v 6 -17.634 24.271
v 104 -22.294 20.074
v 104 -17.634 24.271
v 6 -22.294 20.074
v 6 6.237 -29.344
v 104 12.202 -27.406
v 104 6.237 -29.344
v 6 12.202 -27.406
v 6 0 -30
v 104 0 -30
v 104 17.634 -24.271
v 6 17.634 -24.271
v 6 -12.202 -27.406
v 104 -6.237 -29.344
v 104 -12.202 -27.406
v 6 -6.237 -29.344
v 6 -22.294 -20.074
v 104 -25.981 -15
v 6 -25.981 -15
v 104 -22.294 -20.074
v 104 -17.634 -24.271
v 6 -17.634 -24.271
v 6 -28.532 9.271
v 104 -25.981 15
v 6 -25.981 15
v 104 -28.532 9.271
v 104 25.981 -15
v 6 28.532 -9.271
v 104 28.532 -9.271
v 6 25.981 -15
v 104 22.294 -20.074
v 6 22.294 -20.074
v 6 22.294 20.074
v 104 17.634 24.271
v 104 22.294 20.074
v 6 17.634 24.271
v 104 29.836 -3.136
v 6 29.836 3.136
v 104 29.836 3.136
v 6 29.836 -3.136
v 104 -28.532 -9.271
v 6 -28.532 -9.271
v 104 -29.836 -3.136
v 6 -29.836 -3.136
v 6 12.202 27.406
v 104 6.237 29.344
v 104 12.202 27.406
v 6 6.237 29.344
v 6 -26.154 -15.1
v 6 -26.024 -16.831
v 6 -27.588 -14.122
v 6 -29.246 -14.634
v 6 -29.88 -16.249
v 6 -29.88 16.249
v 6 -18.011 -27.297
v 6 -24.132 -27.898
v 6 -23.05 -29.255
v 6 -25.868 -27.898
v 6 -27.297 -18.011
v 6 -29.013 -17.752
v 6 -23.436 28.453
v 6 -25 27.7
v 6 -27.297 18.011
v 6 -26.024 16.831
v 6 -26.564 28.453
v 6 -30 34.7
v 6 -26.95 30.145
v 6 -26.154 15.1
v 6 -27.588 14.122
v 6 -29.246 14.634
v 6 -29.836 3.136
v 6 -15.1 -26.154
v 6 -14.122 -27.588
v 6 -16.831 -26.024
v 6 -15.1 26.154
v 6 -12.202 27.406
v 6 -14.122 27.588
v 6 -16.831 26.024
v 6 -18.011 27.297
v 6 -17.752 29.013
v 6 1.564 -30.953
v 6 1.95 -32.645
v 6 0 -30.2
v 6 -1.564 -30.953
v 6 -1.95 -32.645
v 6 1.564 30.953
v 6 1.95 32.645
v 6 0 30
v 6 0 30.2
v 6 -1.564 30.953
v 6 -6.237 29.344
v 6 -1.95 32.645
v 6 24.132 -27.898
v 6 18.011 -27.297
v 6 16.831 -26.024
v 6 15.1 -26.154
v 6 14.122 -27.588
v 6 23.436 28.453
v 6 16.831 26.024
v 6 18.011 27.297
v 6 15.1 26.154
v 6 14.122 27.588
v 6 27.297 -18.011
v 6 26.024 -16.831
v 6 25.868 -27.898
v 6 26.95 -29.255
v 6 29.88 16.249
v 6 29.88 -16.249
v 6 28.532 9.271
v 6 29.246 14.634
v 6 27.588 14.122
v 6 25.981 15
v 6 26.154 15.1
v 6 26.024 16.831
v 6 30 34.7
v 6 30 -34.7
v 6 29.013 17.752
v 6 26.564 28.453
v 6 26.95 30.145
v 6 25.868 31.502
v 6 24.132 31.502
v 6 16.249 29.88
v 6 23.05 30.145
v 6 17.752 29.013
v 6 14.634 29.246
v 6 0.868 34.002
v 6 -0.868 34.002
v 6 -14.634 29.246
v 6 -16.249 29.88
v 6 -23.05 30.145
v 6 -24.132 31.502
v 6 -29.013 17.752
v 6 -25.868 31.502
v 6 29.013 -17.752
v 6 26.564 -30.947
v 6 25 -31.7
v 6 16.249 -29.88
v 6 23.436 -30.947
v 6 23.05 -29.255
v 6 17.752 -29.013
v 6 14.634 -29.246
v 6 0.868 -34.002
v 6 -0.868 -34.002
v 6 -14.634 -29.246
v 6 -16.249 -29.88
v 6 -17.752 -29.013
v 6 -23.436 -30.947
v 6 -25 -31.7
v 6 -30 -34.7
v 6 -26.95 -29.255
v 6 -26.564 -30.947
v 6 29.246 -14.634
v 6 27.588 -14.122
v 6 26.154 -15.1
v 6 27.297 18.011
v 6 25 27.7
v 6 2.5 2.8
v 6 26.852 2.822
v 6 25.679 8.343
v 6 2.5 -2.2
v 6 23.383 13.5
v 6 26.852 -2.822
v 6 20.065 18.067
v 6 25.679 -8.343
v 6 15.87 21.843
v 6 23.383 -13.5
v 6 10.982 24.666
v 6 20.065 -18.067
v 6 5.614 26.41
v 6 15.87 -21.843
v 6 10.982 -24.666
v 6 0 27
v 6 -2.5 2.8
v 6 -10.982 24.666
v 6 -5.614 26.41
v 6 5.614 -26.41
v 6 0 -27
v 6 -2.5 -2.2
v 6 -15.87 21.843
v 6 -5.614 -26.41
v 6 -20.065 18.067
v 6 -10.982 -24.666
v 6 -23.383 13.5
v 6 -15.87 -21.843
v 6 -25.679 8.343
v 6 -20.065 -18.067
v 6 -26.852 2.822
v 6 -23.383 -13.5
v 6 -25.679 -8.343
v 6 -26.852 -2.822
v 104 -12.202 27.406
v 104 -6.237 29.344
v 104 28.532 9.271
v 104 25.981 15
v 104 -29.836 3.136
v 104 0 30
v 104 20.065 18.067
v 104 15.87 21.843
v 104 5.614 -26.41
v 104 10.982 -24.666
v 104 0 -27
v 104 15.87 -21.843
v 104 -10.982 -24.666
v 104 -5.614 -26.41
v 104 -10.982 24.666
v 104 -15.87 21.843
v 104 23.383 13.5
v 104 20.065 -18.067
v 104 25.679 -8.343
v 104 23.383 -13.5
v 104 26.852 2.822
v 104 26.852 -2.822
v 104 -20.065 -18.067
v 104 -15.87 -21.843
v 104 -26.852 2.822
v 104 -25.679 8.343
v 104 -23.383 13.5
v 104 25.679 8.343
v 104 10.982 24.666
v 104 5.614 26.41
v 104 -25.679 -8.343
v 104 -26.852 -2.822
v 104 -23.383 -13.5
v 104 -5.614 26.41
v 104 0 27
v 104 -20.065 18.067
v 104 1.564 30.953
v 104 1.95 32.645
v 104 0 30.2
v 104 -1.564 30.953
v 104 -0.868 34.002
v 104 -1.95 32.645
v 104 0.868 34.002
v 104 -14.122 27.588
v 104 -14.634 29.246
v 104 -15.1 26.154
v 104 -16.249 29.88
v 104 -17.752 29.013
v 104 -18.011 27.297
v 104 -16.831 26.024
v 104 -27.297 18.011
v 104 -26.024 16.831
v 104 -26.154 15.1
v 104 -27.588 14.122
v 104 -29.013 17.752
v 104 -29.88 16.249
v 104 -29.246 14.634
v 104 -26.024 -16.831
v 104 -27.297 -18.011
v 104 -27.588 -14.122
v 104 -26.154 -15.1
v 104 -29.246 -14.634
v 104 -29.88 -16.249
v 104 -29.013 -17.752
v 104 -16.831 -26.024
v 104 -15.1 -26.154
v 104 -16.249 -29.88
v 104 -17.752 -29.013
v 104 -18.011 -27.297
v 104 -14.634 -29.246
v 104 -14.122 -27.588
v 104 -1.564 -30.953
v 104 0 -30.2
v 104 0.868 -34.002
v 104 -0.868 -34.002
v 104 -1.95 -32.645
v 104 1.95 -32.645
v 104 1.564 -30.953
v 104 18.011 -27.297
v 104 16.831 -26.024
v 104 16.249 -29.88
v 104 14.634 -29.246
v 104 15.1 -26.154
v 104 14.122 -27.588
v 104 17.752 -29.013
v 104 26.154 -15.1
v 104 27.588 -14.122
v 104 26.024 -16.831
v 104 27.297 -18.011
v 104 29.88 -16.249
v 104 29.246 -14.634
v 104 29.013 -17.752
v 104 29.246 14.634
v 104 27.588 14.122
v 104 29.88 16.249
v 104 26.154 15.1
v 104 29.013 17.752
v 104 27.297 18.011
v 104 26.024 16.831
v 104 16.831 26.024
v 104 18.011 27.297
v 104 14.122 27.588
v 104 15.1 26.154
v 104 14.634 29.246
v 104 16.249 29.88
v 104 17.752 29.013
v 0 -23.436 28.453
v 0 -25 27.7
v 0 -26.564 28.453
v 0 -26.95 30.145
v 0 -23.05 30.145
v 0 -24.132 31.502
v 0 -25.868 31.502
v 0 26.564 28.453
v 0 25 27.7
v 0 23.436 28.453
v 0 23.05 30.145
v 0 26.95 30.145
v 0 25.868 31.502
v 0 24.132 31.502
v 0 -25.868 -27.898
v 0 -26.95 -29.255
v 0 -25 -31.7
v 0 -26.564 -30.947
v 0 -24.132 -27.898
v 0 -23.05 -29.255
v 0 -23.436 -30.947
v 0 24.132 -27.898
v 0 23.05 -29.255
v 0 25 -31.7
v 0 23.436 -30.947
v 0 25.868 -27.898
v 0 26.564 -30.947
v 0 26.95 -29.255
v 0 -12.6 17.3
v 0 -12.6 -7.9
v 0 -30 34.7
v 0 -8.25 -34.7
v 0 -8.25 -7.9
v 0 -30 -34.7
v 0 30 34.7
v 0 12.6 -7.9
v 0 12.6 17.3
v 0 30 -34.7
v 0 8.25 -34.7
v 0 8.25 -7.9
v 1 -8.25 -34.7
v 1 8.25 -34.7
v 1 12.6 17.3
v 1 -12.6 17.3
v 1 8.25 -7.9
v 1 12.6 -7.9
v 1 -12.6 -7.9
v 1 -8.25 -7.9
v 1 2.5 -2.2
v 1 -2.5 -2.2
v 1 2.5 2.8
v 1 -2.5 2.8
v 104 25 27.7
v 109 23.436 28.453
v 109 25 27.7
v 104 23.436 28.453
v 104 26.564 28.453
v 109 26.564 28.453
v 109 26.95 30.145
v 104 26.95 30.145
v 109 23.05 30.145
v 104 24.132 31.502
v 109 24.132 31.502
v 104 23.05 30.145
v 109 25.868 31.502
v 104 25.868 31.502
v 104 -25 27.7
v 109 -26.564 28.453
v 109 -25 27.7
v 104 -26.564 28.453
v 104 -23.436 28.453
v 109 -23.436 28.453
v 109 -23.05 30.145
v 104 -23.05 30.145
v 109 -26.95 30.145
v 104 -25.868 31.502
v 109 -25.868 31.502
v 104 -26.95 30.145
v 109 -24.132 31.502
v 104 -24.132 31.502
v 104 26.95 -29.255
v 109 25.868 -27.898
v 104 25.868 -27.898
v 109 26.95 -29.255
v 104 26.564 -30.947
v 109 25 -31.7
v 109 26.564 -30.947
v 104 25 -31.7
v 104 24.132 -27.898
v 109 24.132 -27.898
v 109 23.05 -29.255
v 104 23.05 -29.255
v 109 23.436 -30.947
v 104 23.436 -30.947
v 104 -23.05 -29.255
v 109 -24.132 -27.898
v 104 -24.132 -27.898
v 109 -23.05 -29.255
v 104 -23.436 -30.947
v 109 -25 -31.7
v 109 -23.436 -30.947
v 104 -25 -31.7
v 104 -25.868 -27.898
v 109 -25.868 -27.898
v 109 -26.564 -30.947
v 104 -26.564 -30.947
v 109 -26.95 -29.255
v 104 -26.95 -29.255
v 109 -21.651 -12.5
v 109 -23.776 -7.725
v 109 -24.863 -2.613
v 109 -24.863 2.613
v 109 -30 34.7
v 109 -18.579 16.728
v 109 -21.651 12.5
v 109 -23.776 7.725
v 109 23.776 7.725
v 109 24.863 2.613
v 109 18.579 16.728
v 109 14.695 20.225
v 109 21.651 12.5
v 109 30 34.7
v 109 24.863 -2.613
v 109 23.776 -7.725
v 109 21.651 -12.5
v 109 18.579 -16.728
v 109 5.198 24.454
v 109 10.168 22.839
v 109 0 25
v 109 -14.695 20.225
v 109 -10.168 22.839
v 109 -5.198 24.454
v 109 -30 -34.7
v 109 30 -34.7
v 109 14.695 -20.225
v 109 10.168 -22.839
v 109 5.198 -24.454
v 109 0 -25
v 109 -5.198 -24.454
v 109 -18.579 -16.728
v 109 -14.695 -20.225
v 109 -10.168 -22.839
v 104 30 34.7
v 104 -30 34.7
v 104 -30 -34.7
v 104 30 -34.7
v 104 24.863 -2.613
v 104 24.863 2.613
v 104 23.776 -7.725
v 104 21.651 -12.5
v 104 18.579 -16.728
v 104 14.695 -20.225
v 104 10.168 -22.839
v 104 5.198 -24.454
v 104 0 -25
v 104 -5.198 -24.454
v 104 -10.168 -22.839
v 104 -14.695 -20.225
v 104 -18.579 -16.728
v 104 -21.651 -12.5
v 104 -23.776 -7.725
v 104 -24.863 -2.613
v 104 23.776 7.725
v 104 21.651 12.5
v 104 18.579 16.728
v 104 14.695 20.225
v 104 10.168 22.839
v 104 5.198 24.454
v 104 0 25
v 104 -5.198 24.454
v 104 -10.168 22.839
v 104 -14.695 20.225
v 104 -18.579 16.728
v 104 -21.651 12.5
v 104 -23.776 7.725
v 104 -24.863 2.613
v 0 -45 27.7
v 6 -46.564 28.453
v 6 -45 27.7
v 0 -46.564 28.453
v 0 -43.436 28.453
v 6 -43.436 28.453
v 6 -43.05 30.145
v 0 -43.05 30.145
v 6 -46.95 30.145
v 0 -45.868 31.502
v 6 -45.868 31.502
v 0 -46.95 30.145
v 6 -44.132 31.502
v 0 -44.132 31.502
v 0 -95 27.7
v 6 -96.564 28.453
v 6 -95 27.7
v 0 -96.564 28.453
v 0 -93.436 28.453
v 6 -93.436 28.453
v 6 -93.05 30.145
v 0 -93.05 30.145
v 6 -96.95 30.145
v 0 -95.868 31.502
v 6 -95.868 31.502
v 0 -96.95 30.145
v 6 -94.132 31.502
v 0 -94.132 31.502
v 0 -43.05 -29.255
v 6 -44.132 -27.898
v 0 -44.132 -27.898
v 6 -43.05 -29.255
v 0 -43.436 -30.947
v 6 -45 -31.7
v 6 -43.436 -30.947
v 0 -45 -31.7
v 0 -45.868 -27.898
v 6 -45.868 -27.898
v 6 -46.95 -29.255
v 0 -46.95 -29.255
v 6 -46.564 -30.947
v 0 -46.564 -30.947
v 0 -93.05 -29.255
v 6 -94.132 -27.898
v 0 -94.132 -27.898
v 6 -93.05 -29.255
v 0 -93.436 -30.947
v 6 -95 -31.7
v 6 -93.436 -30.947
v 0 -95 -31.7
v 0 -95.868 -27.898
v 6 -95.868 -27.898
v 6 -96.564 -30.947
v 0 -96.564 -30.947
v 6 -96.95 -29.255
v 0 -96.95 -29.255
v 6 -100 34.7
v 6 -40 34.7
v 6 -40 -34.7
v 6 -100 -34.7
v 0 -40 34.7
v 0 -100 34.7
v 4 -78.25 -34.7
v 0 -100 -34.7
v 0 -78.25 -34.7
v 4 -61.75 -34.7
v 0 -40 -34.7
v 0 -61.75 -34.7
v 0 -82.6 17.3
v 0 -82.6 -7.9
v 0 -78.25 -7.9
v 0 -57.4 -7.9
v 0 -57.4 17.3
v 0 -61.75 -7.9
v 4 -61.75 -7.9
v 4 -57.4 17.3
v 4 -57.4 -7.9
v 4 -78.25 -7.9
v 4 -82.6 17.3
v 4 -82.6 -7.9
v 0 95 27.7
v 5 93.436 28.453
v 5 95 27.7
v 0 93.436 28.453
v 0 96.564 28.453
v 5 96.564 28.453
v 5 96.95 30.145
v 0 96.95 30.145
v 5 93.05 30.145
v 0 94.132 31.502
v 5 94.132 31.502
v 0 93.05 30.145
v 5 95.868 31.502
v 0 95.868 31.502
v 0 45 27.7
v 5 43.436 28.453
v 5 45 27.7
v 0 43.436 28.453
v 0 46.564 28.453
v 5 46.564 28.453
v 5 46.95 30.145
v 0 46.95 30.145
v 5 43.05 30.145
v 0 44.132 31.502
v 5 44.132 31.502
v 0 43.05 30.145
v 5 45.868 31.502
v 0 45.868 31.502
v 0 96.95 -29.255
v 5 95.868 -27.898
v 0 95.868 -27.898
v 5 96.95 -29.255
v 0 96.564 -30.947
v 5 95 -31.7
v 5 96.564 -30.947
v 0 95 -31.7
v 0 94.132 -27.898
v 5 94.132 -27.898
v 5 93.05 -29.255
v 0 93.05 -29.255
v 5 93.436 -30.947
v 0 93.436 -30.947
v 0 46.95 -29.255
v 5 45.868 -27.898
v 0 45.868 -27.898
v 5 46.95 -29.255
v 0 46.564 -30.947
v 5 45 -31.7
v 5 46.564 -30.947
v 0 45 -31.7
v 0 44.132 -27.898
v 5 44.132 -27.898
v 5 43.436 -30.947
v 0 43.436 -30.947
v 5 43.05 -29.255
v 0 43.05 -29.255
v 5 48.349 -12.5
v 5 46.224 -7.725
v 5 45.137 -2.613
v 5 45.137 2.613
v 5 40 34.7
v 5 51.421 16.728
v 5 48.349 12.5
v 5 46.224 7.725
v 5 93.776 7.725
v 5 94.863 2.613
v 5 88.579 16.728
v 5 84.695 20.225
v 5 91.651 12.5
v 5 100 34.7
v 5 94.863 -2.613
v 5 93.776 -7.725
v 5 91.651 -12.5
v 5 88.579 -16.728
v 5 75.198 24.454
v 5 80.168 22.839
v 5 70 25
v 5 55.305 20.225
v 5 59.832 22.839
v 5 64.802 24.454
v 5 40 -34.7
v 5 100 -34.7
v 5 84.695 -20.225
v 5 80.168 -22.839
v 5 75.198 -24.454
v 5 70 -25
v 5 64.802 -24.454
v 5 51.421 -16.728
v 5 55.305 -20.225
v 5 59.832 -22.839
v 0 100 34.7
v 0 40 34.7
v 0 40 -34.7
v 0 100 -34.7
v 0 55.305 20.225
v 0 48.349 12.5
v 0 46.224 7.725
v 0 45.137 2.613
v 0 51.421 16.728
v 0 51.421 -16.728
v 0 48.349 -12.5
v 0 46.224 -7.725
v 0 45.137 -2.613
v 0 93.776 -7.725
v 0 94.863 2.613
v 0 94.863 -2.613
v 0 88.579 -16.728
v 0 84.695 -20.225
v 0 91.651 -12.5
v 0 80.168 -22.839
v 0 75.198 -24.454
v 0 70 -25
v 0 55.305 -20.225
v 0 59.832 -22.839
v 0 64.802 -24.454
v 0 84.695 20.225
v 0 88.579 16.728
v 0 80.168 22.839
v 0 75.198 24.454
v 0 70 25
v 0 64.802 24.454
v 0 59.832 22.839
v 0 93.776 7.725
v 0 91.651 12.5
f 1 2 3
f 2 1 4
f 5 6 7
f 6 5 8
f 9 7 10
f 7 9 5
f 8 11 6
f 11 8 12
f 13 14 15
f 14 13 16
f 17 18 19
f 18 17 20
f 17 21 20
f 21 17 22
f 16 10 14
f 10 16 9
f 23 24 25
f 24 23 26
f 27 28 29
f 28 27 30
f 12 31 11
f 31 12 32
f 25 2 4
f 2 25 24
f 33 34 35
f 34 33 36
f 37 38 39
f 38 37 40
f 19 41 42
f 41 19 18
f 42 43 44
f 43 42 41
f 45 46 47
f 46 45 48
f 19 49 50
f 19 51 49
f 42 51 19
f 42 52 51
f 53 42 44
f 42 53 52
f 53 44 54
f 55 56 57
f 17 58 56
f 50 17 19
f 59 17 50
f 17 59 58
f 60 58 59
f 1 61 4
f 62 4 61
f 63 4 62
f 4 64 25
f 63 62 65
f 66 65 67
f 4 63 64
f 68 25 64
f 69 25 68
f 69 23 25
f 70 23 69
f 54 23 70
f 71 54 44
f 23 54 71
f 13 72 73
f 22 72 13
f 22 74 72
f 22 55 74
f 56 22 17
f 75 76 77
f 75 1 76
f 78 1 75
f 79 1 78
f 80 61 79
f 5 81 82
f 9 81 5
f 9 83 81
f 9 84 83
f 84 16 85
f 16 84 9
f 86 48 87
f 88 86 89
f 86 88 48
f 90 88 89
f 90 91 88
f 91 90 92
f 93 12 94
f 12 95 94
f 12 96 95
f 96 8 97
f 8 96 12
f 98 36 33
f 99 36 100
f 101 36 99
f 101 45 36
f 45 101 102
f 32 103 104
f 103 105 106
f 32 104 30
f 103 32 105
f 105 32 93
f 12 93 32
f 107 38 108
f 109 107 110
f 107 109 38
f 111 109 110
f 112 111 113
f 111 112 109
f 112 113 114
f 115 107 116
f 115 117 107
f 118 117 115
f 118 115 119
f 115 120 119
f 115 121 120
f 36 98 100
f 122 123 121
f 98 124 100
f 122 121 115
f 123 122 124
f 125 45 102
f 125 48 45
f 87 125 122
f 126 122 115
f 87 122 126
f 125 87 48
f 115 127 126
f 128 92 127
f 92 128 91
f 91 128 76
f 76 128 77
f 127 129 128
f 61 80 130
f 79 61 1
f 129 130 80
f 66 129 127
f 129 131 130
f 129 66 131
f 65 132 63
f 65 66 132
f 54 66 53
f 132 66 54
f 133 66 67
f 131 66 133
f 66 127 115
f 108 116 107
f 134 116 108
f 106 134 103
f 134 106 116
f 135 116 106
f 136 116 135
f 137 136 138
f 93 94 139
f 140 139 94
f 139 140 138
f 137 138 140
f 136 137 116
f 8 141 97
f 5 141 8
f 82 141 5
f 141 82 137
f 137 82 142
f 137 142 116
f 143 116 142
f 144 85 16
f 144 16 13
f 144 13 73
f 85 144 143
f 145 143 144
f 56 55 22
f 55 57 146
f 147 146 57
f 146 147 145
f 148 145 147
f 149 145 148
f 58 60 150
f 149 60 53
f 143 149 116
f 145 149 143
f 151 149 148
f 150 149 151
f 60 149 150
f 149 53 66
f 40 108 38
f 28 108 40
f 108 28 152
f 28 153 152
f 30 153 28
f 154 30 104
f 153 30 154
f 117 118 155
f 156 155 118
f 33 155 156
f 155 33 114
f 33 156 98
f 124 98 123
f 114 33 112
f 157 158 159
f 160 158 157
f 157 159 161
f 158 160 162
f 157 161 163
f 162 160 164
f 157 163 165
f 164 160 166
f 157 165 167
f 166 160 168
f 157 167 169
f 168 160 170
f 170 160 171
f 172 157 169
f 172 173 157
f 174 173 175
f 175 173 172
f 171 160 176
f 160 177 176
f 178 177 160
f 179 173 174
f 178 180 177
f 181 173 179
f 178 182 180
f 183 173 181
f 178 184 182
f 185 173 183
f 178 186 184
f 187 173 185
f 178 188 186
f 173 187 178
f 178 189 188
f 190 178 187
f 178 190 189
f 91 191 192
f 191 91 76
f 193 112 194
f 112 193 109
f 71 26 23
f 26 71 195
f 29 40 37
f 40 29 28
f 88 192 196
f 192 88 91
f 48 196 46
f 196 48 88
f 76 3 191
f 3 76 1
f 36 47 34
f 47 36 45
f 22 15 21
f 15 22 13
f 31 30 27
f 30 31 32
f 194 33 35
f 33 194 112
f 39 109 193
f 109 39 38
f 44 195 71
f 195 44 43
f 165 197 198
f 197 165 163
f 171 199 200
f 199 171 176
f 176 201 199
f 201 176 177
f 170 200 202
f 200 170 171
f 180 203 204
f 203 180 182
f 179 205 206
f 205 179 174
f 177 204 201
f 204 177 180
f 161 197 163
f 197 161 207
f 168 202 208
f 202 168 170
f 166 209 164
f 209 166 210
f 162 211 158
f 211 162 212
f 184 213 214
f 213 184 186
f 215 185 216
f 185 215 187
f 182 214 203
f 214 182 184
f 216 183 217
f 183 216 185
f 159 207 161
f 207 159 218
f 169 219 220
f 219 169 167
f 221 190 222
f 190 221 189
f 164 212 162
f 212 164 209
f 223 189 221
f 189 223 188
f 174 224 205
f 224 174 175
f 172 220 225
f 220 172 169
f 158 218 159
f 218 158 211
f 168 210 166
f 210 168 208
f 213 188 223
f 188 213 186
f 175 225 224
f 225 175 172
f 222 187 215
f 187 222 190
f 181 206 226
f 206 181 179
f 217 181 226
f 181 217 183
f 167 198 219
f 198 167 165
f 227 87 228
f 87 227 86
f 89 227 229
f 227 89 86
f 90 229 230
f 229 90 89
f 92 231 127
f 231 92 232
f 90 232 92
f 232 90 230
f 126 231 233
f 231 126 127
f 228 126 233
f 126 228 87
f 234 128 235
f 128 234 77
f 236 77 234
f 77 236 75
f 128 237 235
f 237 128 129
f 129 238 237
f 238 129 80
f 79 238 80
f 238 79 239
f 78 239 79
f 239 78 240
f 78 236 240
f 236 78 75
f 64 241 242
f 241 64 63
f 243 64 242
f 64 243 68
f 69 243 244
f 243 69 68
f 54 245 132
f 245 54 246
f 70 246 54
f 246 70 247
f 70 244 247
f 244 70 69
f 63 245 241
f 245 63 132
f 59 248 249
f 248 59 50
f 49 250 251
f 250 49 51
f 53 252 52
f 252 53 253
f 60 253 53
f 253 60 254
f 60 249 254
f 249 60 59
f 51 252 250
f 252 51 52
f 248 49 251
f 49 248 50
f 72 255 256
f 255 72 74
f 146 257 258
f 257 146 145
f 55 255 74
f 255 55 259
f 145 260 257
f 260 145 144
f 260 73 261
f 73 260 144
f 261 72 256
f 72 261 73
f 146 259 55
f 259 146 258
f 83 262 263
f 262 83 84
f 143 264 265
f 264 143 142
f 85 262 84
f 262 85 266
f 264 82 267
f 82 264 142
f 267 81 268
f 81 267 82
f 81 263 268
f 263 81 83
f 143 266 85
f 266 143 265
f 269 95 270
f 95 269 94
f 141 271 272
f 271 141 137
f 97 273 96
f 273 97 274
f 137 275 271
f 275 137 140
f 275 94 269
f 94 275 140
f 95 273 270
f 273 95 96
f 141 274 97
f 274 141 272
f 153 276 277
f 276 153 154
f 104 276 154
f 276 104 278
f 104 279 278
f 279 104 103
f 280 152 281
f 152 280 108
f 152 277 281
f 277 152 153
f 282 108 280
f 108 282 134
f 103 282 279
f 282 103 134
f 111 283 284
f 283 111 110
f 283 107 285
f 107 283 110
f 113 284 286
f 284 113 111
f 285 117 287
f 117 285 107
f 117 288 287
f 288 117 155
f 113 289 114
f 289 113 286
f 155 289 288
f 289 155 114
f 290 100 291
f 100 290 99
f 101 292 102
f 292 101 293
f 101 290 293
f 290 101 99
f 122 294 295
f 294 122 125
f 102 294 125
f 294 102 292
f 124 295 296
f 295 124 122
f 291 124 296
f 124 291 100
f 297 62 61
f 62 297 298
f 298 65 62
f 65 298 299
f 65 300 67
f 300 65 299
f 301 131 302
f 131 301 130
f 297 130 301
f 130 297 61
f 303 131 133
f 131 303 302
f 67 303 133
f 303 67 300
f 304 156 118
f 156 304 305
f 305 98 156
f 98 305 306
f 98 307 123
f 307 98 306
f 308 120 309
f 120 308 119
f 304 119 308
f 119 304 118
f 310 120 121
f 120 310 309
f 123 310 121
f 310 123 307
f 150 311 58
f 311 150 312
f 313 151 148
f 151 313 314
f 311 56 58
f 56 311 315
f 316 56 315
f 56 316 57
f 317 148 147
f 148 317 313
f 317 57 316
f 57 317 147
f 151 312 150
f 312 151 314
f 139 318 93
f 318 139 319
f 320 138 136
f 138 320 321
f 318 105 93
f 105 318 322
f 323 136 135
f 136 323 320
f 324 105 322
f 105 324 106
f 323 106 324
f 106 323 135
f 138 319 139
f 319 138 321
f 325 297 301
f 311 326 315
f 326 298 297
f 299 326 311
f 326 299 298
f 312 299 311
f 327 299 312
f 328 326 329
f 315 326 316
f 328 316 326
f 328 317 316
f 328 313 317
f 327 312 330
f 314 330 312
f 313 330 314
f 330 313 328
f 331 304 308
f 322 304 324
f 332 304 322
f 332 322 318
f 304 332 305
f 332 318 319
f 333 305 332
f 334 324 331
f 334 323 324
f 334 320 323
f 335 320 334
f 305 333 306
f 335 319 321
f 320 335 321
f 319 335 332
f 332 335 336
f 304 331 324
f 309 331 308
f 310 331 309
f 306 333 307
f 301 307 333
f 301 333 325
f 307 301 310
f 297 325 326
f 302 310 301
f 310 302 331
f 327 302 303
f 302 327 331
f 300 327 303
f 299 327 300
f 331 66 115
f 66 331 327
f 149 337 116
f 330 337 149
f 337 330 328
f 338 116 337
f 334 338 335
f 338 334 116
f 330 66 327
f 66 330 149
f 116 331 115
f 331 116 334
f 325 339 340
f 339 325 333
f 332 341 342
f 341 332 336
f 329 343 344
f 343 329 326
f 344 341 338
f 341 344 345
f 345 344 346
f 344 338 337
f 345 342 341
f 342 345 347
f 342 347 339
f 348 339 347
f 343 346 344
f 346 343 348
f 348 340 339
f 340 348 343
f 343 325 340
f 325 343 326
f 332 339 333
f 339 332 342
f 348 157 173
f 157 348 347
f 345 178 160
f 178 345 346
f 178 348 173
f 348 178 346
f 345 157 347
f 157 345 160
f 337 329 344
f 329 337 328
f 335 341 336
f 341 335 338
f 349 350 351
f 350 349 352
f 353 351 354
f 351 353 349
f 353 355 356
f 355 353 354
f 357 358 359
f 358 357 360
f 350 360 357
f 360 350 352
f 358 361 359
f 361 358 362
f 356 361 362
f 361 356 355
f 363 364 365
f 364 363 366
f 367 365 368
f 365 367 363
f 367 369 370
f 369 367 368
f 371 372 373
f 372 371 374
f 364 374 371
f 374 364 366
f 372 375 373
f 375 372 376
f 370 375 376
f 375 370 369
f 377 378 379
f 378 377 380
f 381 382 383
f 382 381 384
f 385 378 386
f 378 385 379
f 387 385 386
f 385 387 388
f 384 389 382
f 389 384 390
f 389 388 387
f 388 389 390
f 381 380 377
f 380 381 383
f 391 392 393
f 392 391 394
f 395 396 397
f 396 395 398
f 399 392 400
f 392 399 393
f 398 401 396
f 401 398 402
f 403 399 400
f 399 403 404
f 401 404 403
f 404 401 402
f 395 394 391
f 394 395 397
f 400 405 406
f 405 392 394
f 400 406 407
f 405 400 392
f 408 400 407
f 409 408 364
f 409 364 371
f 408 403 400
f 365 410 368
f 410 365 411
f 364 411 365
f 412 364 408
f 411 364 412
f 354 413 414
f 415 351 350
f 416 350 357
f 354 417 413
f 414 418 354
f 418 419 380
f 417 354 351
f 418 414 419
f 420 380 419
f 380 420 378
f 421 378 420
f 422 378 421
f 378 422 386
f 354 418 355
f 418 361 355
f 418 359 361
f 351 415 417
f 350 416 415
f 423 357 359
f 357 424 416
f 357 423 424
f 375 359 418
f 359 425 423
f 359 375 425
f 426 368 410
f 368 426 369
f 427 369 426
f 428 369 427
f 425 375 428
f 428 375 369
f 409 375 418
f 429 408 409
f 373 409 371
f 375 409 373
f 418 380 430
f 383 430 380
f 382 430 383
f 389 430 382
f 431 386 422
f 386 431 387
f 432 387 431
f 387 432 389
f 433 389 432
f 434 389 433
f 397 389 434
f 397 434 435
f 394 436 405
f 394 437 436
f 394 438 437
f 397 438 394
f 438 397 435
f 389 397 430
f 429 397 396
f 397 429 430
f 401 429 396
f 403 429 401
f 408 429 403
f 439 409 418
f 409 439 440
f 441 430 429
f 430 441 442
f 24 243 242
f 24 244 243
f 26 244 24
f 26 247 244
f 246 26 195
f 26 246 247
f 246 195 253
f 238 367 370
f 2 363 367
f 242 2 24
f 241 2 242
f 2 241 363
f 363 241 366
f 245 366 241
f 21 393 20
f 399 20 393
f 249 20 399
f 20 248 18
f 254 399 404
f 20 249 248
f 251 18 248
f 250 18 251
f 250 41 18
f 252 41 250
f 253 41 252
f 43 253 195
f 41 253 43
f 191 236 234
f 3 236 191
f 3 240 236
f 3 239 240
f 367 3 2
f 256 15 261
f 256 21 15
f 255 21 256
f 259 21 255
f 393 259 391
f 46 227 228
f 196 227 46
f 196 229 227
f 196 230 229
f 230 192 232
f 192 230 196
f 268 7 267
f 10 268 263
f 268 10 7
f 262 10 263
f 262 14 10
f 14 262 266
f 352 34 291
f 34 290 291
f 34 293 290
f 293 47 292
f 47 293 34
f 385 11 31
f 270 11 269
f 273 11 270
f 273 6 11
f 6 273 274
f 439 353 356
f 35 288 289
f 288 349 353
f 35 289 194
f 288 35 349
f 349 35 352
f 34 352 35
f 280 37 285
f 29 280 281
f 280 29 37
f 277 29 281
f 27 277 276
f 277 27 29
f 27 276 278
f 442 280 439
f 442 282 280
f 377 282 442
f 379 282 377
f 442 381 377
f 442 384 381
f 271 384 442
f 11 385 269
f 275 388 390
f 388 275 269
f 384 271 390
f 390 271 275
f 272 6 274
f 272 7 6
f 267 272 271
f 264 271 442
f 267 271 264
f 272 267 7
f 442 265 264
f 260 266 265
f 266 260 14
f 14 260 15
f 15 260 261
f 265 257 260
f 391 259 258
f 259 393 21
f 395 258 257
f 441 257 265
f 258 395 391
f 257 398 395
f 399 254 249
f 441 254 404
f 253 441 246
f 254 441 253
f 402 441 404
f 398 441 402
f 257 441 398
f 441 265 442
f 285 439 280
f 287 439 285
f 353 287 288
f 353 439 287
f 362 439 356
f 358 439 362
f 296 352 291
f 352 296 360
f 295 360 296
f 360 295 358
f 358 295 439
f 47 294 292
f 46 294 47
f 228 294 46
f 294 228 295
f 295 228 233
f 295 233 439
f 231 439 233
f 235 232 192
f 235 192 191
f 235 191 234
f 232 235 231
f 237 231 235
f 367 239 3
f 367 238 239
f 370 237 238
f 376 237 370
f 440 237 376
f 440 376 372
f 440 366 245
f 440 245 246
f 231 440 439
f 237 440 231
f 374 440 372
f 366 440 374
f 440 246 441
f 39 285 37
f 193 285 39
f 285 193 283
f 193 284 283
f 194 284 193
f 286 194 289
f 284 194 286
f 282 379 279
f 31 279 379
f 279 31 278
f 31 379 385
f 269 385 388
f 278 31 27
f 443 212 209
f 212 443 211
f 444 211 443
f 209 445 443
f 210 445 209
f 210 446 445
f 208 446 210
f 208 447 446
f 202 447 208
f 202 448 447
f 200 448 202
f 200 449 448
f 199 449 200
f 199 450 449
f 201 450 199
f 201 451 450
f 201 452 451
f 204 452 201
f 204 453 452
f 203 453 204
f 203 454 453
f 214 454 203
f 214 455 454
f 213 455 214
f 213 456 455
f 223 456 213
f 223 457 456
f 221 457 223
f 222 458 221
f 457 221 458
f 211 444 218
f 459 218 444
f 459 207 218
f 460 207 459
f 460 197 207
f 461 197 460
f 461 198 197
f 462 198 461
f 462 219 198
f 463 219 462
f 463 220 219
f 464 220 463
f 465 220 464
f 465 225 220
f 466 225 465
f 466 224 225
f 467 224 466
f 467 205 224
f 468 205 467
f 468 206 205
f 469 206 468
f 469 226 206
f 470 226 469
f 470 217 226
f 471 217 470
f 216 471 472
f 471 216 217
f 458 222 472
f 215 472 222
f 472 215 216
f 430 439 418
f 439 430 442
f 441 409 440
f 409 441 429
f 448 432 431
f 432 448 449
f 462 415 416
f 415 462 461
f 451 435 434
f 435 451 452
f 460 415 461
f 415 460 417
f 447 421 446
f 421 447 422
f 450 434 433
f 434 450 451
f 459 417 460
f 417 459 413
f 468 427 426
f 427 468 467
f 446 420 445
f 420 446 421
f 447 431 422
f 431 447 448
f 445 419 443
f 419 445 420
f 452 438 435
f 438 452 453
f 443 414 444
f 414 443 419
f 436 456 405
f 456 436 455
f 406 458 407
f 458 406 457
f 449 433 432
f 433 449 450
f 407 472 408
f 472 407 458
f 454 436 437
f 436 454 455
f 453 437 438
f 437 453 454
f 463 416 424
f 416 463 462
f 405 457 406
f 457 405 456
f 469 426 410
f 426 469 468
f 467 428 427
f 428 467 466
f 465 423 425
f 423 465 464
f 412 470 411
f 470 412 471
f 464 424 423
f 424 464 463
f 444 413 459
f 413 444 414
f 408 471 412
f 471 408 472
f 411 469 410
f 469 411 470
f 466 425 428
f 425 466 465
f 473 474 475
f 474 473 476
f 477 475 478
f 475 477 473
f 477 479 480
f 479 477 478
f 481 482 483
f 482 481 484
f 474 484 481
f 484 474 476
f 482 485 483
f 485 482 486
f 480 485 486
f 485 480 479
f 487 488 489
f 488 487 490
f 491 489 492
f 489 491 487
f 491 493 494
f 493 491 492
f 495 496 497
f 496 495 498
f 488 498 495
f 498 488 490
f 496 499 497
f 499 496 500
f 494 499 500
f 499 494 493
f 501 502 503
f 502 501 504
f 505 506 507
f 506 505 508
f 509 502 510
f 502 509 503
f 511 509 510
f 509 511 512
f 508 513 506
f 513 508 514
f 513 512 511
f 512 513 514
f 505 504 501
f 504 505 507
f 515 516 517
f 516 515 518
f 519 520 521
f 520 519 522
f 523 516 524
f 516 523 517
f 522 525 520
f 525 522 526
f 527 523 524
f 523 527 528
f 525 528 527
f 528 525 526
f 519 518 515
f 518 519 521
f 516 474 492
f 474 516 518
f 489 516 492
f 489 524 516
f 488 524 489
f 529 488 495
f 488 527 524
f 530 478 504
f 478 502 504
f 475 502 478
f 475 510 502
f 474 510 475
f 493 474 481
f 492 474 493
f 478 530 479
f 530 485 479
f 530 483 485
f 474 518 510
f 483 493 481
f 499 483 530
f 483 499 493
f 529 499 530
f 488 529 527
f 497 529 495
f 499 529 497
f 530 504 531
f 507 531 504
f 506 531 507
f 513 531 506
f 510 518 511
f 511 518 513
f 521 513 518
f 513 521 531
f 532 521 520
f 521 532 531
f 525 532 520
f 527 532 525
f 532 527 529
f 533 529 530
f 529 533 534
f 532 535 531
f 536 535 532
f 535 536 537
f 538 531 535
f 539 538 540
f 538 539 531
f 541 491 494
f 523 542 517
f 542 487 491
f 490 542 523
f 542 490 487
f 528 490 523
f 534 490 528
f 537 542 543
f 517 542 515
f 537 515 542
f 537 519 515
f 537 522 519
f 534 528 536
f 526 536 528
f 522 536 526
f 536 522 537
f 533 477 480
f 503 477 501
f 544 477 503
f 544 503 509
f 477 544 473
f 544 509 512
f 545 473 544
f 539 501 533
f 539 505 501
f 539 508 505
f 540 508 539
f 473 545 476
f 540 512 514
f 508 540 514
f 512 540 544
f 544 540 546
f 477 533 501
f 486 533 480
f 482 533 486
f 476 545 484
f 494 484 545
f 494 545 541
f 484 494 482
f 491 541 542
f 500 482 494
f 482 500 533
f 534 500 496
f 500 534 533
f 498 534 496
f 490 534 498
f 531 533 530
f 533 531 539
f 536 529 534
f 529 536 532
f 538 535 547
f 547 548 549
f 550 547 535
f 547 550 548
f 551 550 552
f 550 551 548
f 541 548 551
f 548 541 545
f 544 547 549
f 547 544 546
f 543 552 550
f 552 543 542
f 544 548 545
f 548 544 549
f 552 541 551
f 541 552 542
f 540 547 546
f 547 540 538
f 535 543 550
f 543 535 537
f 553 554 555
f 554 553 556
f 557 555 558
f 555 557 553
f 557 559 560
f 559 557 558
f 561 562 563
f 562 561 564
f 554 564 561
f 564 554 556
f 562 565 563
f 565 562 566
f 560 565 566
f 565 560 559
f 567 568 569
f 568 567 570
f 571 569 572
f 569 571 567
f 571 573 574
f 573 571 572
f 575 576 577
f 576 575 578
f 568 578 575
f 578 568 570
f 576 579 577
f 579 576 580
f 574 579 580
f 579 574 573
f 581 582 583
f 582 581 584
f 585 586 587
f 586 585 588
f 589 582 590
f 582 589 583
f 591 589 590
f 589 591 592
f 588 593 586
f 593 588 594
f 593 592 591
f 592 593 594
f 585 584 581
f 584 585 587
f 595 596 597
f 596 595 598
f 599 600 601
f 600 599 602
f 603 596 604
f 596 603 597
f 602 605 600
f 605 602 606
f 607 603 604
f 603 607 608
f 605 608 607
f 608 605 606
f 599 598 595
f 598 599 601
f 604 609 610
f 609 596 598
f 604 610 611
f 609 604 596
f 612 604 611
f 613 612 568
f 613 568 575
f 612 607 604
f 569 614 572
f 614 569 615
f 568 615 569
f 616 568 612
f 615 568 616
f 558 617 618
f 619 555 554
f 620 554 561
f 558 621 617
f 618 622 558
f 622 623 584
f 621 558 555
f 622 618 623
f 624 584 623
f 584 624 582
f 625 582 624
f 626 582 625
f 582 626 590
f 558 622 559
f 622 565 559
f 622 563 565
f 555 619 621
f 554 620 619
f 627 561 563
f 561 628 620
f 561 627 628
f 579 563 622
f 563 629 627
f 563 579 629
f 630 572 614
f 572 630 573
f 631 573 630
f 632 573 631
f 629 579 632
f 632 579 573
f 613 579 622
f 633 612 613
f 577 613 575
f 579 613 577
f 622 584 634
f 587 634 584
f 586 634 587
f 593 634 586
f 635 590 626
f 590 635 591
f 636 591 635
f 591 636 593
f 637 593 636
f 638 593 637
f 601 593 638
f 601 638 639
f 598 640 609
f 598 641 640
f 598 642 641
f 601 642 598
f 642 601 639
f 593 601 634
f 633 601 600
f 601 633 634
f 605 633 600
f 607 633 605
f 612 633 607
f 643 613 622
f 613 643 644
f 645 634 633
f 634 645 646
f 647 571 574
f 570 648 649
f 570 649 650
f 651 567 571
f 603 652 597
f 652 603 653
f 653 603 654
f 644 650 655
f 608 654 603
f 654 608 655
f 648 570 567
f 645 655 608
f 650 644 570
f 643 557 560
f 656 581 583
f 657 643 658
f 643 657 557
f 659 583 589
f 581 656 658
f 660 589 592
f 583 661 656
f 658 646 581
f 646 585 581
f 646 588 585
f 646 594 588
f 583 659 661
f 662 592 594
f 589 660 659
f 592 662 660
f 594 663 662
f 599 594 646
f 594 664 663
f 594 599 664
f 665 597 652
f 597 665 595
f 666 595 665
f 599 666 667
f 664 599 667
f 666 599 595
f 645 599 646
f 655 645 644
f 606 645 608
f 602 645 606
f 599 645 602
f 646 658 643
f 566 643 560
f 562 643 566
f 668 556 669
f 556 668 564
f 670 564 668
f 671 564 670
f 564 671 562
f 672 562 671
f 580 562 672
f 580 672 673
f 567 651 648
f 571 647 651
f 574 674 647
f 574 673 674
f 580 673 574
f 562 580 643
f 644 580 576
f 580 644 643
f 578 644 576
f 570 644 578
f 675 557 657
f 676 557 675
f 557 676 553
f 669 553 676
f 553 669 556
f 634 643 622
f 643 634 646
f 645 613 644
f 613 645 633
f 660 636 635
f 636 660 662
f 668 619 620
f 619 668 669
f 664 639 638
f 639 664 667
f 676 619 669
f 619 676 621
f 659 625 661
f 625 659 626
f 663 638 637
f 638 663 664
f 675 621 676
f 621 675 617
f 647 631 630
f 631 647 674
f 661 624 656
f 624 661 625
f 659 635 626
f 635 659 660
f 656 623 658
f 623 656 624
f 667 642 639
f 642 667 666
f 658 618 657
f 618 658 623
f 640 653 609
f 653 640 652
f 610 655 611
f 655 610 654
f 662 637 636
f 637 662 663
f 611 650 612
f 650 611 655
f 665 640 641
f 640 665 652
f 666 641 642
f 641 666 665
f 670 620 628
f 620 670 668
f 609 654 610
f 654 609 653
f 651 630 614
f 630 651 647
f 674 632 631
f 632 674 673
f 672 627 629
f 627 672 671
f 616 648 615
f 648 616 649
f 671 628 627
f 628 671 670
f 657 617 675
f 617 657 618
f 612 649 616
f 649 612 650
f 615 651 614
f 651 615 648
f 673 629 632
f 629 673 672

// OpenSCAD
// file: FilterHolders.scad
/*
 * openSCAD for a set of Filter holders
 *
 * This file is not for standalone use - it's included in to another
 * openSCAN file for including in to another model.
 *
 * Copyright 2015 Peter T Mount
 * 
 * Licensed under the Apache License, Version 2.0 (the "License");
 * you may not use this file except in compliance with the License.
 * You may obtain a copy of the License at
 * 
 * http://www.apache.org/licenses/LICENSE-2.0
 * 
 * Unless required by applicable law or agreed to in writing, software
 * distributed under the License is distributed on an "AS IS" BASIS,
 * WITHOUT WARRANTIES OR CONDITIONS OF ANY KIND, either express or implied.
 * See the License for the specific language governing permissions and
 * limitations under the License.
 *
 */

/*
 * Module to render a simple Filter Holder
 *
 * To use translate it into the required position so that the filter is centered
 * at the origin & pointing along the x axis.
 *
 * Then call filterSimpleHolder(width,offset,radius)
 *
 * Where:
 *		width		the width of the component
 *		offset 	adjust on the z axis by this amount, usually 0
 *		radius		The radius of the opening of the filter
 *
 */
module filterSimpleHolder(width,offset,radius) {
	assign(half=width/2,oh=offset/2) {
		translate([0,0,oh]) union() {
			difference() {
				translate([0,-half,-half-offset]) cube([5,width,width+offset]);

				// the opening
				translate([-1,0,-oh]) rotate([0,90,0]) cylinder(h=7,r=radius);

				// M4 mounting holes
				for(h=[0:4])
						translate([-1,
							(h%2) ? -half+5 : half-5,
							(floor(h/2)) ? (-half+5-offset) : (half-5)
						])
					rotate([0,90,0])
					cylinder(h=16,r=2);
			}
		}
	}
}
// file: PiCameraMount.scad
/*
 * openSCAD for a simple mount for the Raspberry PI Camera Module
 *
 * This file is not for standalone use - it's included in to another
 * openSCAN file for including in to another model.
 *
 * Copyright 2015 Peter T Mount
 * 
 * Licensed under the Apache License, Version 2.0 (the "License");
 * you may not use this file except in compliance with the License.
 * You may obtain a copy of the License at
 * 
 * http://www.apache.org/licenses/LICENSE-2.0
 * 
 * Unless required by applicable law or agreed to in writing, software
 * distributed under the License is distributed on an "AS IS" BASIS,
 * WITHOUT WARRANTIES OR CONDITIONS OF ANY KIND, either express or implied.
 * See the License for the specific language governing permissions and
 * limitations under the License.
 *
 */

/*
 * Measured dimensions of a PI Camera Module.
 *
 * Width & Depth are the exterior dimensions. 0.25 is to give some manovering room
 * y offset is the height from the bottom of the center of the camera lens
 * ribbon width is just that, if required
 */
piCameraWidth=25.2;
piCameraDepth=24.2;
piCameraYOffset=9.4;
piCameraRibbonWidth=16.5;

/*
 * Module to render a PI camera mount.
 *
 * To use translate it into the required position so that the camera lens
 * is at the origin & pointing along the x axis.
 *
 * Then call piCameraMount(radius,mode)
 *
 * Where:
 *		width	the width of the component
 *		mode	The mode of the render
 *
 * The width must be >30mm as it's used to include the mounting hardware.
 * However you can enlarge it.
 *
 * The mode defines how it's rendered:
 *		0	Render the front panel
 *		1	Render the back panel
 */

module piCamera(width,mode) {
	assign(
		tubeRadius=width/2,
		offset=piCameraYOffset
	) {
		translate([0,0,piCameraYOffset/2]) union() {
			// Front panel
			difference() {
				if(mode)
					translate([6,-tubeRadius,-tubeRadius-offset]) cube([6,width,width+offset]);
				else
					translate([0,-tubeRadius,-tubeRadius-offset]) cube([6,width,width+offset]);

				// Holder for the pi camera module
				translate([5,-piCameraWidth/2,-piCameraWidth/2])
					cube([5,piCameraWidth,piCameraWidth]);

				// Hole for the camera lens
				translate([-0.5,-2.5,-piCameraYOffset+2.5]) cube([6,5,5]);
		
				// Space for ribbon cable
				translate([5,-piCameraRibbonWidth/2,-tubeRadius-1-offset])
					cube([5,piCameraRibbonWidth,tubeRadius+1+offset]);

				// M4 mounting holes
				for(h=[0:4])
						translate([-1,
							(h%2) ? (-tubeRadius+5) : (tubeRadius-5),
							(floor(h/2)) ? (-tubeRadius+5-offset) : (tubeRadius-5)
						])
					rotate([0,90,0])
					cylinder(h=16,r=2);
			}
		}

	}
}

/*
 * Standalone, generate a model of just the camera module with the specified radius
 */
module piCameraStandalone(radius) {
	translate([6,0,0]) rotate([0,0,180]) piCamera(radius,0);
	translate([-6,-radius*3/2,0]) piCamera(radius,1);
}
// main file
/*
 * openSCAD for the solar telescope component for piweather.center
 *
 * This file is not for real use - it's just to draw up some ideas
 * I've had for some time now & won't be actually built until the
 * Mark II station is up and running.
 *
 * The principle is to have a PI camera mounted on the end of a
 * tube with a Solar Filter mounted on the front.
 * 
 * In theory the sun's diameter will be large enough, although a
 * 2x or 4x lens may be added in a future design.
 * This is based on observations seen with the prototype Sky Camera
 * during the summer of 2014.
 *
 * Copyright 2015 Peter T Mount
 * 
 * Licensed under the Apache License, Version 2.0 (the "License");
 * you may not use this file except in compliance with the License.
 * You may obtain a copy of the License at
 * 
 * http://www.apache.org/licenses/LICENSE-2.0
 * 
 * Unless required by applicable law or agreed to in writing, software
 * distributed under the License is distributed on an "AS IS" BASIS,
 * WITHOUT WARRANTIES OR CONDITIONS OF ANY KIND, either express or implied.
 * See the License for the specific language governing permissions and
 * limitations under the License.
 *
 */

// Center tube radius
tubeRadius=30;
tubeLength=100;

/***************************************************************************
 * Do not modify anything below this
 ***************************************************************************/

tubeDiameter=tubeRadius*2;

include <PiCameraMount.scad>
include <FilterHolders.scad>

/***************************************************************************/

// The tube assembly
translate([6,0,0]) union() {
	tube();
	rotate([180,180,0]) cameraHolder(0);
	translate([tubeLength-2,0,0]) filterHolder();
}

// The individual components
translate([-6,-70,0]) cameraHolder(1);
translate([0,70,0]) filterHolder();

/***************************************************************************/

// The main optical tube.

module tube() {
	rotate([0,90,0])
		union() {
			// The tube
			difference() {
				cylinder(h=tubeLength,r=tubeRadius);
				translate([0,0,-1]) cylinder(h=tubeLength+2,r=tubeRadius-3);
			}
			// Support Struts
			for(s=[0:11])
				if(s!=3 && s!=9)
					rotate([0,0,30*s])
					translate([-tubeRadius-2.2,0,0])
					cylinder(h=tubeLength,r=2);
		}
}

// The camera holder
module cameraHolder(mode) {
	piCamera(tubeDiameter,mode);
}

// The filter holder
module filterHolder() {
	filterSimpleHolder(tubeDiameter,piCameraYOffset,tubeRadius-5);
}
